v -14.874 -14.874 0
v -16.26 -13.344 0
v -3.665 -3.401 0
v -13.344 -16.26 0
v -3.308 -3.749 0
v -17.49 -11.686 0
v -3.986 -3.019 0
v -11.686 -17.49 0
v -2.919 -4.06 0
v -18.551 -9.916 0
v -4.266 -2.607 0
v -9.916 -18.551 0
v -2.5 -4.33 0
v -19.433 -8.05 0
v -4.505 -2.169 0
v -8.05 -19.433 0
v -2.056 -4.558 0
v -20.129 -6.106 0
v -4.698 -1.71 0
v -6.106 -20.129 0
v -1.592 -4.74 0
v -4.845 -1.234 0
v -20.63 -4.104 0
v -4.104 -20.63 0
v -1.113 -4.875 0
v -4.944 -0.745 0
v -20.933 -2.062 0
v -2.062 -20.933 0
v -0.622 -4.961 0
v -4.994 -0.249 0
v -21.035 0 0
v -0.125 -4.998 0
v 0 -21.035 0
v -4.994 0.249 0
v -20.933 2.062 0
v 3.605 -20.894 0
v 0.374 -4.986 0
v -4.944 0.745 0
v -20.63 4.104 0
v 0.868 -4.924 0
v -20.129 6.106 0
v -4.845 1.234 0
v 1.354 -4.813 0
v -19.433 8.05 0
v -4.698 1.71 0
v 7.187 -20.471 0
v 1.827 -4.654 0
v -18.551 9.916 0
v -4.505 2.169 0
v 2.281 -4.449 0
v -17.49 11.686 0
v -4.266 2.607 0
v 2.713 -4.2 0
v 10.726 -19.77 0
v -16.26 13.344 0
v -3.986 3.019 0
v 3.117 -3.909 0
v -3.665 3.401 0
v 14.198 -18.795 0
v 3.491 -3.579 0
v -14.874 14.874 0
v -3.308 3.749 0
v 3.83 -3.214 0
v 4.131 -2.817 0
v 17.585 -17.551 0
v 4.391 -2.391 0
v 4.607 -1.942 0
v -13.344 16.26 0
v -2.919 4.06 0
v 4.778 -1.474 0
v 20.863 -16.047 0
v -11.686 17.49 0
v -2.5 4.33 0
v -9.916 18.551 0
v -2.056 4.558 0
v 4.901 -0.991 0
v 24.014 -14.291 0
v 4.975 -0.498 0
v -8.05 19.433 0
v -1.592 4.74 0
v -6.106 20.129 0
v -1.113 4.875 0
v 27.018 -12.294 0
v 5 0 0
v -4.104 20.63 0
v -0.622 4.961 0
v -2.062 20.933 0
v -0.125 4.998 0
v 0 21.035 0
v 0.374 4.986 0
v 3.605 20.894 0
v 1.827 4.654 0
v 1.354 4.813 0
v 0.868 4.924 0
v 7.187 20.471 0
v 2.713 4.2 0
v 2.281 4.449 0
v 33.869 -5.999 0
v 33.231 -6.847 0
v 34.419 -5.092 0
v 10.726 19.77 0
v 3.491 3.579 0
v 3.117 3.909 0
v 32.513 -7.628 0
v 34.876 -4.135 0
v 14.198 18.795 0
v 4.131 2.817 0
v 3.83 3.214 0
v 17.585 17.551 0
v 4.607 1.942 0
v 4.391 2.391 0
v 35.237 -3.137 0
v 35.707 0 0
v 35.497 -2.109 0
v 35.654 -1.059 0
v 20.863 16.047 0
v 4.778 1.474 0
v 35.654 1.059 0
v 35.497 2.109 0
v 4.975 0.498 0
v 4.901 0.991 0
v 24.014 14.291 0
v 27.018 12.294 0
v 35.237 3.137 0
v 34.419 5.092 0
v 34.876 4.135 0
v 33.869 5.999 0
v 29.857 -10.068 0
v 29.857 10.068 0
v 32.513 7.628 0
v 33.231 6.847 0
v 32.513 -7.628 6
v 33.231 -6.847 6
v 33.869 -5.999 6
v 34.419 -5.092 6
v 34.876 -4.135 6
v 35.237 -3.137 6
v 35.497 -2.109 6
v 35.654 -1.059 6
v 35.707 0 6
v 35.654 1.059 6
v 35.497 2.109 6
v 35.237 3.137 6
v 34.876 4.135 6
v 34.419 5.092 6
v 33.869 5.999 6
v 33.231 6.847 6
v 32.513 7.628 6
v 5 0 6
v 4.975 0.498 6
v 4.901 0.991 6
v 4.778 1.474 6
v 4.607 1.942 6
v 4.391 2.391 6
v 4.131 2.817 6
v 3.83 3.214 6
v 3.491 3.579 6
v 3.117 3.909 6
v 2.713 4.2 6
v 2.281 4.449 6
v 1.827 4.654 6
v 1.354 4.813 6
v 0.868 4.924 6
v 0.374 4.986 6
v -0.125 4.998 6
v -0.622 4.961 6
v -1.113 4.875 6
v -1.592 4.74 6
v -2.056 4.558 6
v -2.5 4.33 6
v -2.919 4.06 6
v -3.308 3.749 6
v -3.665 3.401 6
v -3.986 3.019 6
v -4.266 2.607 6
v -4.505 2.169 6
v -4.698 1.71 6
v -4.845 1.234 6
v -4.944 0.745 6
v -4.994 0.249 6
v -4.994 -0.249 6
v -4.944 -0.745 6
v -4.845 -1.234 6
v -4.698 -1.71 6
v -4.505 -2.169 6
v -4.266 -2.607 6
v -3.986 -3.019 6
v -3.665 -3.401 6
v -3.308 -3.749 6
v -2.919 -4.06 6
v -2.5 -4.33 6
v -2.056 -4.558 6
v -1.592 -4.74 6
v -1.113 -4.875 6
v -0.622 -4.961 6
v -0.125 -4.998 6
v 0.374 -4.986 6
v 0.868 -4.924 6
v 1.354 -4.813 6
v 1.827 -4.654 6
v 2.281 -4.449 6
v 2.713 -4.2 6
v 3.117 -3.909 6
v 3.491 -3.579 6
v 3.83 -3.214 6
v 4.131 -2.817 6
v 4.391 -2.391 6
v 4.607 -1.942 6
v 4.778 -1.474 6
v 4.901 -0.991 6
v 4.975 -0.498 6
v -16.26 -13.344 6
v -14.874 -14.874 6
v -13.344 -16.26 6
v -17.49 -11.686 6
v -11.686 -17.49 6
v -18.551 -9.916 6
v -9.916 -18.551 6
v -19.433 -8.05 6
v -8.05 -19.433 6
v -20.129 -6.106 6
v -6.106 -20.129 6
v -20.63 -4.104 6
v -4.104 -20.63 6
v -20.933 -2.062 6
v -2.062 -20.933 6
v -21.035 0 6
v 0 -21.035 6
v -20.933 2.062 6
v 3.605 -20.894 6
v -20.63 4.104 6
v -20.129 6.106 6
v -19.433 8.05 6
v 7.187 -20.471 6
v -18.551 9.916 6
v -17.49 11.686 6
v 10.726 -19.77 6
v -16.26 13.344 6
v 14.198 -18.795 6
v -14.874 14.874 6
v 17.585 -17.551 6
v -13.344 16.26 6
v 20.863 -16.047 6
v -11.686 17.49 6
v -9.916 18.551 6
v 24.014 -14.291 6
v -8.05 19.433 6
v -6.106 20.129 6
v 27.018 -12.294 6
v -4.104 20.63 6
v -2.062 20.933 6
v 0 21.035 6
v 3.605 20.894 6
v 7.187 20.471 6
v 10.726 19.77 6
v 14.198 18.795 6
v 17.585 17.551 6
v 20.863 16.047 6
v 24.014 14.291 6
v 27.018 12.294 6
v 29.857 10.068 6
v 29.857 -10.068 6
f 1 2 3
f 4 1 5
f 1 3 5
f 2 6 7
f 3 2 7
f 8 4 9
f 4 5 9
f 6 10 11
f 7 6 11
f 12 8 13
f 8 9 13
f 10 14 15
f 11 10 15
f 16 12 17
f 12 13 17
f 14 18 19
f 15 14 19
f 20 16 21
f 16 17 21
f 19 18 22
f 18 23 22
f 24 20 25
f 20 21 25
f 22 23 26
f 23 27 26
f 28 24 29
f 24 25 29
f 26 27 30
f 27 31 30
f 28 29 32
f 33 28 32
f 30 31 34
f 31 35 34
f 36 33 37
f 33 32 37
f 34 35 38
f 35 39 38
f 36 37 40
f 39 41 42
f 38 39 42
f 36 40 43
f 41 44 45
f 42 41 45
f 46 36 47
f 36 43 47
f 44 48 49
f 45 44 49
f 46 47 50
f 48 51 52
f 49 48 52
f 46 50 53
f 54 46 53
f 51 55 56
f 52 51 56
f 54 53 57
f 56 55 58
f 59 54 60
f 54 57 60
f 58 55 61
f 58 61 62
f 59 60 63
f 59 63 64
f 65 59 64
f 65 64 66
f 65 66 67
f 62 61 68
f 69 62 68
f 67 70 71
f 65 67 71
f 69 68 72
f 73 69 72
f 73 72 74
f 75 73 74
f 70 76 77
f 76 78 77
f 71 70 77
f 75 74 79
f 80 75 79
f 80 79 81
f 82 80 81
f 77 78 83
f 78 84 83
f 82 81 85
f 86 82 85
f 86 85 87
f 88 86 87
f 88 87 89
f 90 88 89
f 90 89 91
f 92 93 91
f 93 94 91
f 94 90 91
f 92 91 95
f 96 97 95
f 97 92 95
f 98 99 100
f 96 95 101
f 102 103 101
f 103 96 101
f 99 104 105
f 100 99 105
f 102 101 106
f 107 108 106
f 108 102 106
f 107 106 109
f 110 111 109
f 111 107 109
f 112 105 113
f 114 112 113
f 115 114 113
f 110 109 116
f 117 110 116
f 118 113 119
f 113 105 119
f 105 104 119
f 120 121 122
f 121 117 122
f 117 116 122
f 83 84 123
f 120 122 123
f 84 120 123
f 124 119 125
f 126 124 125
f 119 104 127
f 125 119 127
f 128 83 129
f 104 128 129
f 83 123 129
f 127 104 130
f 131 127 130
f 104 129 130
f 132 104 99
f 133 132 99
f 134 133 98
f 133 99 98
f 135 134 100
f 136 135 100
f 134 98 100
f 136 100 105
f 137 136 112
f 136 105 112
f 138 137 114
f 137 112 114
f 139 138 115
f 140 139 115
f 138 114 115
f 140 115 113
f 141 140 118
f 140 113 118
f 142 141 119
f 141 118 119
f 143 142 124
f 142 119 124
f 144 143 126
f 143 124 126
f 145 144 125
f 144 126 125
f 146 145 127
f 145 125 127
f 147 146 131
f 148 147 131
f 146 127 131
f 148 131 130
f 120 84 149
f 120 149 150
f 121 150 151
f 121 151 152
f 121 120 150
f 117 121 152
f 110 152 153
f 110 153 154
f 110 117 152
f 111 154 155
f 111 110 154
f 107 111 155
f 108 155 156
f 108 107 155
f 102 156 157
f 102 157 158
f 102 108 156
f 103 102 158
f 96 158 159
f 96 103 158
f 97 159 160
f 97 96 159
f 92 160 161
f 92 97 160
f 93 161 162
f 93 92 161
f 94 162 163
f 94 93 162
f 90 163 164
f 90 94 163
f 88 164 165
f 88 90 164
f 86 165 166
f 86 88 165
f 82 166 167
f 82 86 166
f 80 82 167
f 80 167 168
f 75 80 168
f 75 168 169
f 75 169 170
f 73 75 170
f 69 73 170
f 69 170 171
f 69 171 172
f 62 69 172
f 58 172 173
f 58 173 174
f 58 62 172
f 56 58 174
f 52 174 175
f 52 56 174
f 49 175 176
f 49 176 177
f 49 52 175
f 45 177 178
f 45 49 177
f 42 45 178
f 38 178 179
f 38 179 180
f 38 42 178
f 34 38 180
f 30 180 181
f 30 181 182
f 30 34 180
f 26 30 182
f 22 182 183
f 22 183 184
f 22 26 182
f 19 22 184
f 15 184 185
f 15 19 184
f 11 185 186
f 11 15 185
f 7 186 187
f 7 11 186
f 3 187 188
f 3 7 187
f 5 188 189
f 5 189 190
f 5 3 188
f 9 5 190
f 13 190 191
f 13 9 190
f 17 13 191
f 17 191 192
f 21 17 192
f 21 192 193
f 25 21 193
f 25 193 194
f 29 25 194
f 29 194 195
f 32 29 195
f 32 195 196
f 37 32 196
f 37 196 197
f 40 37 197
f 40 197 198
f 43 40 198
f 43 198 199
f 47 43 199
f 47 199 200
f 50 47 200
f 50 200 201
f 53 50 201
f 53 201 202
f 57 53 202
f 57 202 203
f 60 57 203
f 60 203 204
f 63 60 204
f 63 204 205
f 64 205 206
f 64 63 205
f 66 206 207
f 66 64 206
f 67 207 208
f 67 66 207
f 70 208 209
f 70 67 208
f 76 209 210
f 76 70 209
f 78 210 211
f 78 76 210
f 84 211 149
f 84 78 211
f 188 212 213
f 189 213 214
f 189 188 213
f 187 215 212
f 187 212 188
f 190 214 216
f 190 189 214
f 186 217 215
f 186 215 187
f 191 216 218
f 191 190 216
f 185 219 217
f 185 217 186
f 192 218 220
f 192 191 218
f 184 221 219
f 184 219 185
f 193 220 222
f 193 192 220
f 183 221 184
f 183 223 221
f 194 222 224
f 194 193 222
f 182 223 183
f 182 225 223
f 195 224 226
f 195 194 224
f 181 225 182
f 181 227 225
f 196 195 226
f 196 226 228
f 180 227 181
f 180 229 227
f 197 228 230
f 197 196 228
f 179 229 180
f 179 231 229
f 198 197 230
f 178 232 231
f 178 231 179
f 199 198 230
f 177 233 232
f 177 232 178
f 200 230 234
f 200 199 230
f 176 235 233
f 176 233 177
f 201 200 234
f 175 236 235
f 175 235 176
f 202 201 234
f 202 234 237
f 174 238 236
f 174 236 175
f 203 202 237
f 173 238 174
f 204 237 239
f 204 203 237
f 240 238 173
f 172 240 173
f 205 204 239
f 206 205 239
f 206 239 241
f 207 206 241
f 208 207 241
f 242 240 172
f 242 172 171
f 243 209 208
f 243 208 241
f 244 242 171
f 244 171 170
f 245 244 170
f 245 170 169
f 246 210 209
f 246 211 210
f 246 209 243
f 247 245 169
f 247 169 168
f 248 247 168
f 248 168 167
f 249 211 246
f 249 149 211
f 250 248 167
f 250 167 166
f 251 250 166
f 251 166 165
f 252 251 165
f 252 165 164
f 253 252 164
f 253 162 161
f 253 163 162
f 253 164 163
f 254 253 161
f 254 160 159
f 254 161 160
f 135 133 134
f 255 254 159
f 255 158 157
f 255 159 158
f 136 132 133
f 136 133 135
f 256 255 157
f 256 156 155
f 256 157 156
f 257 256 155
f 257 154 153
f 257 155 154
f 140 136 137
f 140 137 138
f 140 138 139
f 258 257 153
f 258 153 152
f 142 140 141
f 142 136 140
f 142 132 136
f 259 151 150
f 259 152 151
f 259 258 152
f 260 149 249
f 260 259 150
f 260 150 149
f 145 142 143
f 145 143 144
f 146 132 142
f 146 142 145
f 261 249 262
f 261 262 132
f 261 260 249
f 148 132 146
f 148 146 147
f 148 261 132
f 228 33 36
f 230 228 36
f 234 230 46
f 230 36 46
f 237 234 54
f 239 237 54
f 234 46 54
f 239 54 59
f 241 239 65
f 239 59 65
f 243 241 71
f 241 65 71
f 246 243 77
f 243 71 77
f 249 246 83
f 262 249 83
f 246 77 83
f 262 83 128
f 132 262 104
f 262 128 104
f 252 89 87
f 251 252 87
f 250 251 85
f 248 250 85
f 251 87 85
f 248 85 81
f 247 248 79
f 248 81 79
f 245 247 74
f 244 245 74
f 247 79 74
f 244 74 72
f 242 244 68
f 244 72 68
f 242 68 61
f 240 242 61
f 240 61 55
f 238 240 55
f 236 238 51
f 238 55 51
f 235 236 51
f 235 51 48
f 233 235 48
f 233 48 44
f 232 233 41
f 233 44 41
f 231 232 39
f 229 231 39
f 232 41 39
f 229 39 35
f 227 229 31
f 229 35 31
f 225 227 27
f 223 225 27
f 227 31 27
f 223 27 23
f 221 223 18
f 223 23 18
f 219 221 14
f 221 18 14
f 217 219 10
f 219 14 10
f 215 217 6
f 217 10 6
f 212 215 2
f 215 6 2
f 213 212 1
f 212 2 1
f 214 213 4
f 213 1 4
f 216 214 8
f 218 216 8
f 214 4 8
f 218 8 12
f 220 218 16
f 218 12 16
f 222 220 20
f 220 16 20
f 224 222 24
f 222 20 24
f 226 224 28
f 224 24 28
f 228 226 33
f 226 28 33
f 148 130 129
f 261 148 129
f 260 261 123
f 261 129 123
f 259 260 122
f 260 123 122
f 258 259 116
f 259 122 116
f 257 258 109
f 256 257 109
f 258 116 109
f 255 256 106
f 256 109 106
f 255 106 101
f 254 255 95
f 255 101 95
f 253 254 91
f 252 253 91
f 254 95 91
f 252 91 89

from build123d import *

# Parameters (mm, degrees)
SKETCH1_R           = 5
BOSS_EXTRUDE3_DEPTH = 6


with BuildPart() as part:
    # Sketch1 → Boss-Extrude3 (new body)
    with BuildSketch(Plane.XY):
        with BuildLine():
            ThreePointArc((0, 21.034581504), (-21.034581504, 0), (0, -21.034581504))
            ThreePointArc((0, -21.034581504), (17.584571554, -17.551352165), (32.513452001, -7.627715134))
            ThreePointArc((32.513452001, -7.627715134), (35.706726817, 0), (32.513452001, 7.627715134))
            ThreePointArc((32.513452001, 7.627715134), (17.584571554, 17.551352165), (0, 21.034581504))
        make_face()
        Circle(SKETCH1_R, mode=Mode.SUBTRACT)
    extrude(amount=BOSS_EXTRUDE3_DEPTH)


solid = part.part
